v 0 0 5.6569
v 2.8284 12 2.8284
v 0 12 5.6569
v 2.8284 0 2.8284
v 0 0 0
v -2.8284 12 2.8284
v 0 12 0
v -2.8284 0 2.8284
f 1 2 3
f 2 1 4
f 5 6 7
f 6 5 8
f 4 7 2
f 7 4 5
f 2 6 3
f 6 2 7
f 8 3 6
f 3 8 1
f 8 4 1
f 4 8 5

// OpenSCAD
// Construct: rotate() with an [x,y,z] Euler-angle vector.
rotate([45, 0, 90]) cube([12, 4, 4]);
